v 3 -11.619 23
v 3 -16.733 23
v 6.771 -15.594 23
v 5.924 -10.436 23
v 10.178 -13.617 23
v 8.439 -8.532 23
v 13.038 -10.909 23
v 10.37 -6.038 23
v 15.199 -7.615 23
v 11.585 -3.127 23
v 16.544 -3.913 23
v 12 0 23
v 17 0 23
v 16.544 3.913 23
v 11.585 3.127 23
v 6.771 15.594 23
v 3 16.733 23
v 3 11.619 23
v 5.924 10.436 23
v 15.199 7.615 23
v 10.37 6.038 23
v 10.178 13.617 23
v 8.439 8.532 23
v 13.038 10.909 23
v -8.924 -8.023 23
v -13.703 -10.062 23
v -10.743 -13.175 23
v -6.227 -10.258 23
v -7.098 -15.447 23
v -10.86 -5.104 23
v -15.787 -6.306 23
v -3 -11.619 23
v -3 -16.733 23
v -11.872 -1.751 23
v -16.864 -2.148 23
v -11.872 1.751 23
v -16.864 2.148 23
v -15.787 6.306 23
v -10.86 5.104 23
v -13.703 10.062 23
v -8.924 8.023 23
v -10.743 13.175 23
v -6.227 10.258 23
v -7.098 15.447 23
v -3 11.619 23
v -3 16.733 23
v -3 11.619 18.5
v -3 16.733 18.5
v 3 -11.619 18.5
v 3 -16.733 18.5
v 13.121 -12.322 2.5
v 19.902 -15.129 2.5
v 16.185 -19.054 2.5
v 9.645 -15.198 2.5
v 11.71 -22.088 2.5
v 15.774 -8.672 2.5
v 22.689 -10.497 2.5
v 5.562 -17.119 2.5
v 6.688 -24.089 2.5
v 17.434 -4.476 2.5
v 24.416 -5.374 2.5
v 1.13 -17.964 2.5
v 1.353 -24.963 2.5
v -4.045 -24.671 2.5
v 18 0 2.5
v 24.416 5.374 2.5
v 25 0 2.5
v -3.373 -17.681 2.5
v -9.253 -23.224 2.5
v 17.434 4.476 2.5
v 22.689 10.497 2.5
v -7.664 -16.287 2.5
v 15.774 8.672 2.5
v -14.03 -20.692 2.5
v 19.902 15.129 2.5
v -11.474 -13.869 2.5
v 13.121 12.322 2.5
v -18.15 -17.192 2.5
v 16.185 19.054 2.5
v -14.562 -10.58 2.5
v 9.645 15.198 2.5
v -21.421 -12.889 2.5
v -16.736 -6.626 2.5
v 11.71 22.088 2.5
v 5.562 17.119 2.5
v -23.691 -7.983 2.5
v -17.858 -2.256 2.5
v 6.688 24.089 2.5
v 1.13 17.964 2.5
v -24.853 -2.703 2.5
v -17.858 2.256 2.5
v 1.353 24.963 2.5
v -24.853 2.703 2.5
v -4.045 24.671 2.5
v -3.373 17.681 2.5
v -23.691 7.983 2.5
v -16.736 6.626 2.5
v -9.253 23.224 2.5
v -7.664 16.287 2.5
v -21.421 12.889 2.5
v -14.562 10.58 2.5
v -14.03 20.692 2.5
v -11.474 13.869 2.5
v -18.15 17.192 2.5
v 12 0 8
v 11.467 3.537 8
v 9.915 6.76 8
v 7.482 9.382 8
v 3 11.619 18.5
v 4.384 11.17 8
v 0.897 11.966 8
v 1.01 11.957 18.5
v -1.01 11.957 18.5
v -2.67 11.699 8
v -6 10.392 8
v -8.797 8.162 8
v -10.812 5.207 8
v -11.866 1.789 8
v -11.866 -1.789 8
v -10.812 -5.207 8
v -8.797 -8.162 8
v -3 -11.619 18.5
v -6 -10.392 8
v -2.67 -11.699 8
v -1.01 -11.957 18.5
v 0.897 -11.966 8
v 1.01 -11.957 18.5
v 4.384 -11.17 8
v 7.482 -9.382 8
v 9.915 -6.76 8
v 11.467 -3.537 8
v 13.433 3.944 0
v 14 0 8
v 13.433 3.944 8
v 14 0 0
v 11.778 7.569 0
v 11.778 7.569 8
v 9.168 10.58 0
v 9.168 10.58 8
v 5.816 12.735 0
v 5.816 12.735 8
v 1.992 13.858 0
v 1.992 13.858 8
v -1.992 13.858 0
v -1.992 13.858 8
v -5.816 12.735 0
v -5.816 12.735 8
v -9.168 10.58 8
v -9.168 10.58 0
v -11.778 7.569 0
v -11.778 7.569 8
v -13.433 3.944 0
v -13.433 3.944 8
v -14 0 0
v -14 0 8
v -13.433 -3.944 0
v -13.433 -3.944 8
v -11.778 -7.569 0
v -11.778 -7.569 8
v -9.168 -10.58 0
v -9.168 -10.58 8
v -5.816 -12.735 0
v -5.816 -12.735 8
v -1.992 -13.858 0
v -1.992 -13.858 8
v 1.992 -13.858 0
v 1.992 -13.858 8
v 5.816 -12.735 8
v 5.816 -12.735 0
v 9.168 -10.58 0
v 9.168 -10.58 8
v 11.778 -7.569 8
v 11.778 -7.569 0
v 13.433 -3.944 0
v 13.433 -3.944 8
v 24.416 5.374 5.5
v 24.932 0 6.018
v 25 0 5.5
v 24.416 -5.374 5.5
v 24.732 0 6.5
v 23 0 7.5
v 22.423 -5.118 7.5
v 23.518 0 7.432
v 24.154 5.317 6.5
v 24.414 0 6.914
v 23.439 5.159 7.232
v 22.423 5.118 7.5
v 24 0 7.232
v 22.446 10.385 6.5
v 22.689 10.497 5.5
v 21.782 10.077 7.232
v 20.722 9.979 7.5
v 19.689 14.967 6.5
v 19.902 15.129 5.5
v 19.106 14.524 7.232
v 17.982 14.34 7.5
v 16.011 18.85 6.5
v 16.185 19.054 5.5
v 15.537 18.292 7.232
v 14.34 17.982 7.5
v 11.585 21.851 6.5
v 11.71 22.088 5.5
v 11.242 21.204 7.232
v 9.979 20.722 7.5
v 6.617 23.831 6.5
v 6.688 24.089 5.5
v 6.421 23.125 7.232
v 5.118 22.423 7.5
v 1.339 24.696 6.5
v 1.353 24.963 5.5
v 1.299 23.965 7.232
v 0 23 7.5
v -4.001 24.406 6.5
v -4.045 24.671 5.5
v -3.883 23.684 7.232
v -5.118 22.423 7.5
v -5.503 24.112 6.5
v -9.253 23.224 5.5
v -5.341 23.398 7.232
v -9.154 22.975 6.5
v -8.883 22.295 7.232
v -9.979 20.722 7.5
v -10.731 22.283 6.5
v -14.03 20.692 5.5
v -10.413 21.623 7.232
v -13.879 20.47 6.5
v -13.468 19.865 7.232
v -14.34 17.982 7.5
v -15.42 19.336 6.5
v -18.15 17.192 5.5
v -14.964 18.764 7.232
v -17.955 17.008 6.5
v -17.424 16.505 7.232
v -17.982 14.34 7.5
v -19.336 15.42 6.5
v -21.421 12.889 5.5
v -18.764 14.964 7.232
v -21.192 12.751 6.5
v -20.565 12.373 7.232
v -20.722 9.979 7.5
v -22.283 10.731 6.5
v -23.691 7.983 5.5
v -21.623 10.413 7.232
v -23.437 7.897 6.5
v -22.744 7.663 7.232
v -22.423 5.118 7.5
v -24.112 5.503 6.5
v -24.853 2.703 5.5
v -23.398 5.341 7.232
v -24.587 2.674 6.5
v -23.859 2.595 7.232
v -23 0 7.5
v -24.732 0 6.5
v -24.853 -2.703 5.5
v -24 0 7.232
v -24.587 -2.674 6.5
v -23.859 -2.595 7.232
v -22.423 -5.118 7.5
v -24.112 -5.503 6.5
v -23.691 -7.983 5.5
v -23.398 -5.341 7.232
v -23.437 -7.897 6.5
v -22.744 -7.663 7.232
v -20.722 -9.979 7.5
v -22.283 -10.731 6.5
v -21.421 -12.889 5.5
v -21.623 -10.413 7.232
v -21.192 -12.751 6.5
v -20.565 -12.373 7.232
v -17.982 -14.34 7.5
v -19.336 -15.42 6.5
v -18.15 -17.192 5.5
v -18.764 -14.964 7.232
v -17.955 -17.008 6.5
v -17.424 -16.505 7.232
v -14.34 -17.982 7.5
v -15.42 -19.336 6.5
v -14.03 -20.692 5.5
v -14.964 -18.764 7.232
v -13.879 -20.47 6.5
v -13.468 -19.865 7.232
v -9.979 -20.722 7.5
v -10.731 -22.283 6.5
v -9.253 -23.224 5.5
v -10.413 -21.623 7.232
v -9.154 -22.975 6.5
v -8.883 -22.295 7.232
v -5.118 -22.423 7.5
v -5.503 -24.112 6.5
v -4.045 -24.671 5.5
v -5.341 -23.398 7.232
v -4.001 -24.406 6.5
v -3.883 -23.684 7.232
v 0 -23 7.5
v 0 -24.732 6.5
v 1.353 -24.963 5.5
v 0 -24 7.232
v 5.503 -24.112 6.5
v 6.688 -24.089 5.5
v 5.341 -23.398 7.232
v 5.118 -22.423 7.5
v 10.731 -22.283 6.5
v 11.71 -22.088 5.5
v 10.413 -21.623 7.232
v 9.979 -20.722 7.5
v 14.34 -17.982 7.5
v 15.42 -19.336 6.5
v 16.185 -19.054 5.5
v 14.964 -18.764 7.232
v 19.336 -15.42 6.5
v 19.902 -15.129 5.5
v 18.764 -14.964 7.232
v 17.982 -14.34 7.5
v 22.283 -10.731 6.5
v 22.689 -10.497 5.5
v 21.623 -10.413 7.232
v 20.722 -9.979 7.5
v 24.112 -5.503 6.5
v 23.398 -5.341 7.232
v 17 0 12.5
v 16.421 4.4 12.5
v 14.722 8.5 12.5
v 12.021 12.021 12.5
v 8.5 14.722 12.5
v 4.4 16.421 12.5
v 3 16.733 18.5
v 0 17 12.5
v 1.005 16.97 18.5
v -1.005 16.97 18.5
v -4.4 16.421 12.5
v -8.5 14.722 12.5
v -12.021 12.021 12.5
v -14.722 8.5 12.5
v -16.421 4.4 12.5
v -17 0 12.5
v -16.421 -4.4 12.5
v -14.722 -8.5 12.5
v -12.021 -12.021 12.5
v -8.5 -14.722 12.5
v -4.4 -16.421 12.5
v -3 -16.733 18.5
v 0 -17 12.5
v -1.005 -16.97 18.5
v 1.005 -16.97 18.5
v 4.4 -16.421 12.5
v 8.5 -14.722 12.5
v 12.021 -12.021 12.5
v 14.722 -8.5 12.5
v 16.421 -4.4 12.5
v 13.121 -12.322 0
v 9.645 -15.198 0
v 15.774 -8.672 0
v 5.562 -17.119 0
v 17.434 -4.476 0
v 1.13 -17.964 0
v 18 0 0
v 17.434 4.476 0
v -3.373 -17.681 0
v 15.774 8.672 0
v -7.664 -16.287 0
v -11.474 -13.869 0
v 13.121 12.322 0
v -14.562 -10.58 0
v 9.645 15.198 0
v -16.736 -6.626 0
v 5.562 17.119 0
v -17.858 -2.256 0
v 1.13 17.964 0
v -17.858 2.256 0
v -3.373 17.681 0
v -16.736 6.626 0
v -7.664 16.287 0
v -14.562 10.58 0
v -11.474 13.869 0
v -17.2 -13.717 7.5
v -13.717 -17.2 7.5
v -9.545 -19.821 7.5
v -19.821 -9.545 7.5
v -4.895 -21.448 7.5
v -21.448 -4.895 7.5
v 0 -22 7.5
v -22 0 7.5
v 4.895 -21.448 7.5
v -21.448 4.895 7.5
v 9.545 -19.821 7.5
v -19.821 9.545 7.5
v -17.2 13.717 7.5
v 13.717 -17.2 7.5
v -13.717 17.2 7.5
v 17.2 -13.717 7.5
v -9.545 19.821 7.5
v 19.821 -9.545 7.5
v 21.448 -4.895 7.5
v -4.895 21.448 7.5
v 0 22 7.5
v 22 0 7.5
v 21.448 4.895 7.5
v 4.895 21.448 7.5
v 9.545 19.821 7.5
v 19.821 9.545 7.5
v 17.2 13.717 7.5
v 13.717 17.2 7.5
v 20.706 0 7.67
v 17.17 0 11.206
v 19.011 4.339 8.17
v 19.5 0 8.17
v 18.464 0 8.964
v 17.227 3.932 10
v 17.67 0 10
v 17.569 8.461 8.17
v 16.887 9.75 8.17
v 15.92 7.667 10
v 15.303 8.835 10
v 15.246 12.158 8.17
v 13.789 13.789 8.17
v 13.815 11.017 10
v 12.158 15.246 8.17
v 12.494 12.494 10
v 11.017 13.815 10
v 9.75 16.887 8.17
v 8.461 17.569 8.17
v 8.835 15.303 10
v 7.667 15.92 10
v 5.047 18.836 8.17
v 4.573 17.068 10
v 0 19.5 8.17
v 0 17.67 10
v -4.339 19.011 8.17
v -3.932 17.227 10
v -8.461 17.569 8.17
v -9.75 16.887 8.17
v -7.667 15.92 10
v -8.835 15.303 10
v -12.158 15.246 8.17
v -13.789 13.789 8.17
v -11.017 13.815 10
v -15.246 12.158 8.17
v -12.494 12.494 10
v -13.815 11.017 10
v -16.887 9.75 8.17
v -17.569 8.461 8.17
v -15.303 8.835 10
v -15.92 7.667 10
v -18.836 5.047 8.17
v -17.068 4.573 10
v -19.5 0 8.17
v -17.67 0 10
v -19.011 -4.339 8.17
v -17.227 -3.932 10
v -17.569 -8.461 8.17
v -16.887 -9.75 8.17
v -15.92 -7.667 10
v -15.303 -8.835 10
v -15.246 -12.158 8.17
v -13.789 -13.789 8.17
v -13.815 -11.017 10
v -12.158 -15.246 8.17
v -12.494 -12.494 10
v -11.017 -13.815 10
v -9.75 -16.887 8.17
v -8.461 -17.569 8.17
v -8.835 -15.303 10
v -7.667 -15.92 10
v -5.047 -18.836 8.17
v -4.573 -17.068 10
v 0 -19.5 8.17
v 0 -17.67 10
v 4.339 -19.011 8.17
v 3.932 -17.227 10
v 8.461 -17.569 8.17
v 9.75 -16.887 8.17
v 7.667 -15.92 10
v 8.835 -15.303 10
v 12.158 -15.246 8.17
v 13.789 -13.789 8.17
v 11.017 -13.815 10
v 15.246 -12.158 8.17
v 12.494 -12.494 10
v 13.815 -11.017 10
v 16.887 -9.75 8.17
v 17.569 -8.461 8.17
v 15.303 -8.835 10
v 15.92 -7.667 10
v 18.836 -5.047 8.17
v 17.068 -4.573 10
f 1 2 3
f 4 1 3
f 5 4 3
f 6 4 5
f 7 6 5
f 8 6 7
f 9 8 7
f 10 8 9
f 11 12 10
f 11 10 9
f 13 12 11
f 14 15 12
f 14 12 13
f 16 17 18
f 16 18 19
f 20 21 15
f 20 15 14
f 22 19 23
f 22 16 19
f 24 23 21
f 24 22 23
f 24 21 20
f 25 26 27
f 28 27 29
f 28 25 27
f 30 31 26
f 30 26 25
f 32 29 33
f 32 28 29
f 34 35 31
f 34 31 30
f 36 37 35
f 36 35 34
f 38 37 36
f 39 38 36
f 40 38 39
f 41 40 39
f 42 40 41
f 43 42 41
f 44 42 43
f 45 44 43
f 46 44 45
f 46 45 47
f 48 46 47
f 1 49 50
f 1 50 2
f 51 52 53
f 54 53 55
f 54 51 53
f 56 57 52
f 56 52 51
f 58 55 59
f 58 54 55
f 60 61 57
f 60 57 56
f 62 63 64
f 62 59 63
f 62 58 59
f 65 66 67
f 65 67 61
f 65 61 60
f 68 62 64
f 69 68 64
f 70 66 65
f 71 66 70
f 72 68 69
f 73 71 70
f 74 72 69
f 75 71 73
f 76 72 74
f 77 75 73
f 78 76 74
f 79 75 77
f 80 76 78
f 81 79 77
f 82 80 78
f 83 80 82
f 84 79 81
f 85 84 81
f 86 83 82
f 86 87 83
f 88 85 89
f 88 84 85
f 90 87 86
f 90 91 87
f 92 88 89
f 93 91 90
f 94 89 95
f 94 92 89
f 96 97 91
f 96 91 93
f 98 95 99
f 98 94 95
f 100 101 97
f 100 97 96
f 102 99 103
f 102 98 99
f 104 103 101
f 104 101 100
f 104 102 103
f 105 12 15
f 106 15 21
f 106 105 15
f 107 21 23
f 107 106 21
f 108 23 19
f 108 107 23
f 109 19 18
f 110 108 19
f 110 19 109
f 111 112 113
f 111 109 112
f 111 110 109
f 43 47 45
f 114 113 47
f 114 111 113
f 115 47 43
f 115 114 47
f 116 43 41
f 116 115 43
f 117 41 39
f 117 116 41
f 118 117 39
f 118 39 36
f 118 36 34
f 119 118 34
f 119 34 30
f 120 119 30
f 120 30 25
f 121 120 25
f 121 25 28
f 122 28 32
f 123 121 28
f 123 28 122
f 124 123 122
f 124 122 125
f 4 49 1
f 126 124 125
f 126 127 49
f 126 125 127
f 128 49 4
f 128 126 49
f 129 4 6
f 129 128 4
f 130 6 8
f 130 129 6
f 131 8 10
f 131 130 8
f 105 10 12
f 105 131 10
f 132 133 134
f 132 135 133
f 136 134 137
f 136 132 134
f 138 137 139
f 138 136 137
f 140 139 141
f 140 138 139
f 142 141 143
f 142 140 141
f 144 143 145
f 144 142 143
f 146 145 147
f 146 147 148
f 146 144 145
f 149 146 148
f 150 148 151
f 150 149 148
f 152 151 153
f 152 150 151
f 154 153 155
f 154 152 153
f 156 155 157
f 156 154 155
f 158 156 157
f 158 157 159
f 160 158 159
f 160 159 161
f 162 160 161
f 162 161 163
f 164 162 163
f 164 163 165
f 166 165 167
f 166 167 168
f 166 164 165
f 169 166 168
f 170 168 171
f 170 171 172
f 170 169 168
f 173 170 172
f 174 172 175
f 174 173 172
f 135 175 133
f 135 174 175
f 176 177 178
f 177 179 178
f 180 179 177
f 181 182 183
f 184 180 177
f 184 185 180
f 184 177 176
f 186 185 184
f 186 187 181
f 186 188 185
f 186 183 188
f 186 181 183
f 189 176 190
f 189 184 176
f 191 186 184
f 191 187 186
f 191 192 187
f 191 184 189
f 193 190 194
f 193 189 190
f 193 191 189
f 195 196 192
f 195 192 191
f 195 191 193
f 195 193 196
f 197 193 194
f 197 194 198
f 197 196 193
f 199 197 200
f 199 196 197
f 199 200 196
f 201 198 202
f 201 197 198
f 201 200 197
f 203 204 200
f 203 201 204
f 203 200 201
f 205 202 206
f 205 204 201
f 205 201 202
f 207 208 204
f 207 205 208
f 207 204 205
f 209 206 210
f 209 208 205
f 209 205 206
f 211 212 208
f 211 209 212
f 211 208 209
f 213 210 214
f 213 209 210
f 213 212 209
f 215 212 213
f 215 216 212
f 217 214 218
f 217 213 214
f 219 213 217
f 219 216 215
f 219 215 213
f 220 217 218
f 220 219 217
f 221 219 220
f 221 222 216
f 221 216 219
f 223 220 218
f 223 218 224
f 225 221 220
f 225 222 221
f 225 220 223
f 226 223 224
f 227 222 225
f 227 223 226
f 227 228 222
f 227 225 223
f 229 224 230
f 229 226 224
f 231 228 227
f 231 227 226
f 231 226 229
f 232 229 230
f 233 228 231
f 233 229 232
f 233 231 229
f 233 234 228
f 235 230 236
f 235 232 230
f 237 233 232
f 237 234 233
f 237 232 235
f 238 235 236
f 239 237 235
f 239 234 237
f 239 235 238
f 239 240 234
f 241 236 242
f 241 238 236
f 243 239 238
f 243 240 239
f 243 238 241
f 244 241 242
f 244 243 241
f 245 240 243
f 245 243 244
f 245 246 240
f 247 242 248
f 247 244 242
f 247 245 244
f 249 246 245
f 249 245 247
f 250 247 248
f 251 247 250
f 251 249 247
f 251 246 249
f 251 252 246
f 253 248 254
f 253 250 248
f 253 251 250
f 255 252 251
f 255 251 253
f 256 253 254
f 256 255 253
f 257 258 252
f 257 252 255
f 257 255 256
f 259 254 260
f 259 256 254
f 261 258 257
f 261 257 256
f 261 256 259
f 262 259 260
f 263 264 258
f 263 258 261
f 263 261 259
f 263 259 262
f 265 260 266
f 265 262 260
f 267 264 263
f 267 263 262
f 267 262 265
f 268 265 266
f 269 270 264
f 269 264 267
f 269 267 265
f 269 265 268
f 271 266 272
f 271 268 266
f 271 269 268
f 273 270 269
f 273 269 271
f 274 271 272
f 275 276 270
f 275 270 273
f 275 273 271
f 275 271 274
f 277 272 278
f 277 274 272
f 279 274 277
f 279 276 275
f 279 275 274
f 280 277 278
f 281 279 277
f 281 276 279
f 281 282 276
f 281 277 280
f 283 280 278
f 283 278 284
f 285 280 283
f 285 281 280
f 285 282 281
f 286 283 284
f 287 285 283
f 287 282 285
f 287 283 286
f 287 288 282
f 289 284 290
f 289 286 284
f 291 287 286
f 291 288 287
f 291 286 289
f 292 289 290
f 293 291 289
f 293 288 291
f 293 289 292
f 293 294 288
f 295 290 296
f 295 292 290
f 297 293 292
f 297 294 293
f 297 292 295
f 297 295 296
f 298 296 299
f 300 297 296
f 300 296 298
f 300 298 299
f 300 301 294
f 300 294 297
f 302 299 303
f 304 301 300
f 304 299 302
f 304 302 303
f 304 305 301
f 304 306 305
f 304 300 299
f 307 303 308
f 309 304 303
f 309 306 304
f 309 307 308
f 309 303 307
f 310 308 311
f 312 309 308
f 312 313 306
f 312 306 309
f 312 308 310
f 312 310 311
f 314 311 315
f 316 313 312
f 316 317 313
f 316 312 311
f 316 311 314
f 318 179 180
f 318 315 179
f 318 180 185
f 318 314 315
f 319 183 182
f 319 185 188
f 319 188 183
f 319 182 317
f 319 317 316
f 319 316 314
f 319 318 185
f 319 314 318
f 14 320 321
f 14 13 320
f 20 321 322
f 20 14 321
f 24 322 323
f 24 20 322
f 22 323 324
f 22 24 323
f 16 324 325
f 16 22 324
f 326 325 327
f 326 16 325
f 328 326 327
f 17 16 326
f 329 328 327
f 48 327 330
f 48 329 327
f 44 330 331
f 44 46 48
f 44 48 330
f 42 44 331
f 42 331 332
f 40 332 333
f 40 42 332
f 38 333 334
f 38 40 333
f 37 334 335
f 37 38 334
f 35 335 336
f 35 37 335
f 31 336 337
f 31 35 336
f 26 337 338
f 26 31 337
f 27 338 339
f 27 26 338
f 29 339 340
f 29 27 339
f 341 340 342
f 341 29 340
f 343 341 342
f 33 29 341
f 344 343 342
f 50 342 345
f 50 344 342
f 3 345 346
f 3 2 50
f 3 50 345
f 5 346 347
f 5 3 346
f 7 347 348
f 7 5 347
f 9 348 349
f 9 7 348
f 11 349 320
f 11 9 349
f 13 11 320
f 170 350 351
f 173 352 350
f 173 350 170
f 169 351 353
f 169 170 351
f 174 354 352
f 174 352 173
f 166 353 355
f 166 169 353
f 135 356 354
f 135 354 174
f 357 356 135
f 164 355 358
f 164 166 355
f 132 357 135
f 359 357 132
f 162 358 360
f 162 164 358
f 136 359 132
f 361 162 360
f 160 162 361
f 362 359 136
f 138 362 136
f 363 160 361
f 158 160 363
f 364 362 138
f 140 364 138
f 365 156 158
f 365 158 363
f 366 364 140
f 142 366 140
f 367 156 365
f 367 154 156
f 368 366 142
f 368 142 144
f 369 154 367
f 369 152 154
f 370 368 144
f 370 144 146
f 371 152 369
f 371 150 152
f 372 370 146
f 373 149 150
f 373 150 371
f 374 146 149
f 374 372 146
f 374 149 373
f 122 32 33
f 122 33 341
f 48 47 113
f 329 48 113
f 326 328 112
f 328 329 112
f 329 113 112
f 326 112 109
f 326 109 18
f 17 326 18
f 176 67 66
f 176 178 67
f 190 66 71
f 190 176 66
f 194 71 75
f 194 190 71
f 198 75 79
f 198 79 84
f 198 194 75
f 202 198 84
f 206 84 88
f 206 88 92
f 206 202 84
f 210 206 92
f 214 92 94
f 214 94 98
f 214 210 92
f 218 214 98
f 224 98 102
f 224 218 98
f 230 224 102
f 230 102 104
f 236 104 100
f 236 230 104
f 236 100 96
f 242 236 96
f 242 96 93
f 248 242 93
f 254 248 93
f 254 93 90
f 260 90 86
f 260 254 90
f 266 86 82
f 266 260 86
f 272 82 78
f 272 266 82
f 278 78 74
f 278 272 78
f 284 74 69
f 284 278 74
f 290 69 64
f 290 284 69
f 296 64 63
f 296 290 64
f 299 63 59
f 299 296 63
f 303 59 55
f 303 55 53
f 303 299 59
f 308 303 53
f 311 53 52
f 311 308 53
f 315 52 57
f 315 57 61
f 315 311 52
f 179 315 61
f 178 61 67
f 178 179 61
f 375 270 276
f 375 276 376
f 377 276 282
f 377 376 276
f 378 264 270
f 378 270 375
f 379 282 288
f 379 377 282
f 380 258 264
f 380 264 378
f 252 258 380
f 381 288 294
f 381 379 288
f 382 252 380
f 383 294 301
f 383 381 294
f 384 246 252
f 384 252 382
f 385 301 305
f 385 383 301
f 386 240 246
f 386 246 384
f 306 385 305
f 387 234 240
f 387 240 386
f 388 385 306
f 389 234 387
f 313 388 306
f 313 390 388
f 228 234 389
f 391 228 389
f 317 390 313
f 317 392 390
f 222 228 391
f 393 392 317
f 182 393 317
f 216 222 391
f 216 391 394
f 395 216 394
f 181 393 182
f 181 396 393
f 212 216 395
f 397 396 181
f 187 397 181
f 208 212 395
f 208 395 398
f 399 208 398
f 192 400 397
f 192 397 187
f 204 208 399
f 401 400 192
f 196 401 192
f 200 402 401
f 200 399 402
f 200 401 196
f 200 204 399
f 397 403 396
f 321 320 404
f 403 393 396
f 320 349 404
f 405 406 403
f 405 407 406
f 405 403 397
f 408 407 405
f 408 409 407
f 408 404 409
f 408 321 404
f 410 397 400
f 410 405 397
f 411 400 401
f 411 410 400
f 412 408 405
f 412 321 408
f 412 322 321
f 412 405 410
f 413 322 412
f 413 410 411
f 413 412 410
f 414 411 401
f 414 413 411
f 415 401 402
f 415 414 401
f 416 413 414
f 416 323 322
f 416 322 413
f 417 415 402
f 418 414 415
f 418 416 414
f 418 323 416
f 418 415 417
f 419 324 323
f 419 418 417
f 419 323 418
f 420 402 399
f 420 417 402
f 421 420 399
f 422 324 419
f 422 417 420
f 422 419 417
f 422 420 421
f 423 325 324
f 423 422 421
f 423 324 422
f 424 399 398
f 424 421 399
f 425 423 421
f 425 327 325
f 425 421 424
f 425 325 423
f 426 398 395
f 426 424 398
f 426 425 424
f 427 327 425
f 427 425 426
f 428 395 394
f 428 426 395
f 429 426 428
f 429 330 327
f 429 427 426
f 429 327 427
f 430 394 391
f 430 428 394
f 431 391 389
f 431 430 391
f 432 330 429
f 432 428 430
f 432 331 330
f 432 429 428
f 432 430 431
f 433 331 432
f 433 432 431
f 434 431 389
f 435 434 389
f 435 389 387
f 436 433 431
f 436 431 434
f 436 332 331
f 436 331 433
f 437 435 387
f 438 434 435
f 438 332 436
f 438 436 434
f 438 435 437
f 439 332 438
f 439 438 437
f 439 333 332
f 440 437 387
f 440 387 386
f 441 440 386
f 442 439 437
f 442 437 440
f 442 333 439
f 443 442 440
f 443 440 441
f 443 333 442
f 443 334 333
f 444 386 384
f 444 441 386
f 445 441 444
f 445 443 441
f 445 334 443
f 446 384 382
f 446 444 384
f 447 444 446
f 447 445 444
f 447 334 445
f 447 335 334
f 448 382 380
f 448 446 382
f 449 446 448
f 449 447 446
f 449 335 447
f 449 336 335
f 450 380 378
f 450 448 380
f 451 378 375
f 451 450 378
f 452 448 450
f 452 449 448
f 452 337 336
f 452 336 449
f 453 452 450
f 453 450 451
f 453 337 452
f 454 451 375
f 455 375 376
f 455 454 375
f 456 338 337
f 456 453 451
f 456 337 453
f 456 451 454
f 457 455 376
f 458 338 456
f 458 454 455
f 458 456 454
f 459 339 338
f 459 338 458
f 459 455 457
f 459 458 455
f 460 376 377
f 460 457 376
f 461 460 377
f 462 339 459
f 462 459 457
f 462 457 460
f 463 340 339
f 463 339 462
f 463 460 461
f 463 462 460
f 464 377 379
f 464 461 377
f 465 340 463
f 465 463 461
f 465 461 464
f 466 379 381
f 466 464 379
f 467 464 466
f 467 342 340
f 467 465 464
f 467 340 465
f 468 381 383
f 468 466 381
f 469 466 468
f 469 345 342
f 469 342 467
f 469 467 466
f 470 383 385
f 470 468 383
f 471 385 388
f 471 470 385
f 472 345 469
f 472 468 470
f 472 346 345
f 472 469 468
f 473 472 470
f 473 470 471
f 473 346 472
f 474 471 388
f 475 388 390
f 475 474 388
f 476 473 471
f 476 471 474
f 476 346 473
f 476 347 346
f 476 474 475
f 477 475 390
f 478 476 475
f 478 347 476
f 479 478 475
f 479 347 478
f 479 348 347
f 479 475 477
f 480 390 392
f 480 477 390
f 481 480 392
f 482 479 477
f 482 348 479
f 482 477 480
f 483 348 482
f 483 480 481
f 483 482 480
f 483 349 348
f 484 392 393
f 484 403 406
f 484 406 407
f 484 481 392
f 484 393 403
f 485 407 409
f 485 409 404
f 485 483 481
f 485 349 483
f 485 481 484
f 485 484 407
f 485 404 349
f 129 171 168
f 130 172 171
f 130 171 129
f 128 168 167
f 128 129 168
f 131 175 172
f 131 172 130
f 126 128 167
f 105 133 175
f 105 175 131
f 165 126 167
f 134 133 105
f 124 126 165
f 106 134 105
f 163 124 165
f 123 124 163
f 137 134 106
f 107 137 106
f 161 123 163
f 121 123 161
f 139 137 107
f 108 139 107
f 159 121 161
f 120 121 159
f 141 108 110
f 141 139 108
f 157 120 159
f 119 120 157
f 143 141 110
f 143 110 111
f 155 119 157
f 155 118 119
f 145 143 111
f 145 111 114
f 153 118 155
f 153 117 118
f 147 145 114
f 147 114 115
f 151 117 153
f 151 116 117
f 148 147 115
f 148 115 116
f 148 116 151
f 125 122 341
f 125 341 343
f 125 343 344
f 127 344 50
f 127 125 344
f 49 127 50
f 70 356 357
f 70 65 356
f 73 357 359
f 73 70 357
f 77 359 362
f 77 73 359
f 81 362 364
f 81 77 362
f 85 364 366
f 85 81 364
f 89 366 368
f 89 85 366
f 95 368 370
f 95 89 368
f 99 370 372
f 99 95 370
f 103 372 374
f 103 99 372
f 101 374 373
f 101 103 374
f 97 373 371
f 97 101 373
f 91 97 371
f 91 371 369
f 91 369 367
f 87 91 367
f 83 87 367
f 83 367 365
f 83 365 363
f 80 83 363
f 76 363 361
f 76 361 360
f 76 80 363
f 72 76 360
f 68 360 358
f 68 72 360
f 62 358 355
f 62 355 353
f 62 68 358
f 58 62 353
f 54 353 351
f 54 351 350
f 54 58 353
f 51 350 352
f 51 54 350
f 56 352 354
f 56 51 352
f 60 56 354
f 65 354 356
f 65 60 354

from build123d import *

# Parameters (mm, degrees)
F2_DEPTH      = 25.0010001
F2_DEPTH_BACK = 25.001


with BuildPart() as f1:
    # F0 (on Front) → F1 (revolve)
    with BuildSketch(Plane.XZ):
        with BuildLine():
            Line((14, 8), (14, 0))
            Line((14, 0), (18, 0))
            Line((18, 0), (18, 2.5))
            Line((18, 2.5), (25, 2.5))
            Line((25, 2.5), (25, 5.5))
            ThreePointArc((25, 5.5), (24.4142135624, 6.9142135624), (23, 7.5))
            Line((23, 7.5), (22, 7.5))
            ThreePointArc((22, 7.5), (18.4644660941, 8.9644660941), (17, 12.5))
            Line((17, 12.5), (17, 23))
            Line((17, 23), (12, 23))
            Line((12, 23), (12, 8))
            Line((12, 8), (14, 8))
        make_face()
    revolve(axis=Axis((0, 0, 19.0387922476), (0, 0, 1)))

    # F0 (on Front) → F2 (cut, two sides)
    with BuildSketch(Plane.XZ) as f2_sk:
        Polygon((3, 23), (0, 23), (-3, 23), (-3, 18.5), (3, 18.5), align=None)
    extrude(amount=-F2_DEPTH, mode=Mode.SUBTRACT)
    extrude(f2_sk.sketch, amount=F2_DEPTH_BACK, mode=Mode.SUBTRACT)


solid = f1.part
